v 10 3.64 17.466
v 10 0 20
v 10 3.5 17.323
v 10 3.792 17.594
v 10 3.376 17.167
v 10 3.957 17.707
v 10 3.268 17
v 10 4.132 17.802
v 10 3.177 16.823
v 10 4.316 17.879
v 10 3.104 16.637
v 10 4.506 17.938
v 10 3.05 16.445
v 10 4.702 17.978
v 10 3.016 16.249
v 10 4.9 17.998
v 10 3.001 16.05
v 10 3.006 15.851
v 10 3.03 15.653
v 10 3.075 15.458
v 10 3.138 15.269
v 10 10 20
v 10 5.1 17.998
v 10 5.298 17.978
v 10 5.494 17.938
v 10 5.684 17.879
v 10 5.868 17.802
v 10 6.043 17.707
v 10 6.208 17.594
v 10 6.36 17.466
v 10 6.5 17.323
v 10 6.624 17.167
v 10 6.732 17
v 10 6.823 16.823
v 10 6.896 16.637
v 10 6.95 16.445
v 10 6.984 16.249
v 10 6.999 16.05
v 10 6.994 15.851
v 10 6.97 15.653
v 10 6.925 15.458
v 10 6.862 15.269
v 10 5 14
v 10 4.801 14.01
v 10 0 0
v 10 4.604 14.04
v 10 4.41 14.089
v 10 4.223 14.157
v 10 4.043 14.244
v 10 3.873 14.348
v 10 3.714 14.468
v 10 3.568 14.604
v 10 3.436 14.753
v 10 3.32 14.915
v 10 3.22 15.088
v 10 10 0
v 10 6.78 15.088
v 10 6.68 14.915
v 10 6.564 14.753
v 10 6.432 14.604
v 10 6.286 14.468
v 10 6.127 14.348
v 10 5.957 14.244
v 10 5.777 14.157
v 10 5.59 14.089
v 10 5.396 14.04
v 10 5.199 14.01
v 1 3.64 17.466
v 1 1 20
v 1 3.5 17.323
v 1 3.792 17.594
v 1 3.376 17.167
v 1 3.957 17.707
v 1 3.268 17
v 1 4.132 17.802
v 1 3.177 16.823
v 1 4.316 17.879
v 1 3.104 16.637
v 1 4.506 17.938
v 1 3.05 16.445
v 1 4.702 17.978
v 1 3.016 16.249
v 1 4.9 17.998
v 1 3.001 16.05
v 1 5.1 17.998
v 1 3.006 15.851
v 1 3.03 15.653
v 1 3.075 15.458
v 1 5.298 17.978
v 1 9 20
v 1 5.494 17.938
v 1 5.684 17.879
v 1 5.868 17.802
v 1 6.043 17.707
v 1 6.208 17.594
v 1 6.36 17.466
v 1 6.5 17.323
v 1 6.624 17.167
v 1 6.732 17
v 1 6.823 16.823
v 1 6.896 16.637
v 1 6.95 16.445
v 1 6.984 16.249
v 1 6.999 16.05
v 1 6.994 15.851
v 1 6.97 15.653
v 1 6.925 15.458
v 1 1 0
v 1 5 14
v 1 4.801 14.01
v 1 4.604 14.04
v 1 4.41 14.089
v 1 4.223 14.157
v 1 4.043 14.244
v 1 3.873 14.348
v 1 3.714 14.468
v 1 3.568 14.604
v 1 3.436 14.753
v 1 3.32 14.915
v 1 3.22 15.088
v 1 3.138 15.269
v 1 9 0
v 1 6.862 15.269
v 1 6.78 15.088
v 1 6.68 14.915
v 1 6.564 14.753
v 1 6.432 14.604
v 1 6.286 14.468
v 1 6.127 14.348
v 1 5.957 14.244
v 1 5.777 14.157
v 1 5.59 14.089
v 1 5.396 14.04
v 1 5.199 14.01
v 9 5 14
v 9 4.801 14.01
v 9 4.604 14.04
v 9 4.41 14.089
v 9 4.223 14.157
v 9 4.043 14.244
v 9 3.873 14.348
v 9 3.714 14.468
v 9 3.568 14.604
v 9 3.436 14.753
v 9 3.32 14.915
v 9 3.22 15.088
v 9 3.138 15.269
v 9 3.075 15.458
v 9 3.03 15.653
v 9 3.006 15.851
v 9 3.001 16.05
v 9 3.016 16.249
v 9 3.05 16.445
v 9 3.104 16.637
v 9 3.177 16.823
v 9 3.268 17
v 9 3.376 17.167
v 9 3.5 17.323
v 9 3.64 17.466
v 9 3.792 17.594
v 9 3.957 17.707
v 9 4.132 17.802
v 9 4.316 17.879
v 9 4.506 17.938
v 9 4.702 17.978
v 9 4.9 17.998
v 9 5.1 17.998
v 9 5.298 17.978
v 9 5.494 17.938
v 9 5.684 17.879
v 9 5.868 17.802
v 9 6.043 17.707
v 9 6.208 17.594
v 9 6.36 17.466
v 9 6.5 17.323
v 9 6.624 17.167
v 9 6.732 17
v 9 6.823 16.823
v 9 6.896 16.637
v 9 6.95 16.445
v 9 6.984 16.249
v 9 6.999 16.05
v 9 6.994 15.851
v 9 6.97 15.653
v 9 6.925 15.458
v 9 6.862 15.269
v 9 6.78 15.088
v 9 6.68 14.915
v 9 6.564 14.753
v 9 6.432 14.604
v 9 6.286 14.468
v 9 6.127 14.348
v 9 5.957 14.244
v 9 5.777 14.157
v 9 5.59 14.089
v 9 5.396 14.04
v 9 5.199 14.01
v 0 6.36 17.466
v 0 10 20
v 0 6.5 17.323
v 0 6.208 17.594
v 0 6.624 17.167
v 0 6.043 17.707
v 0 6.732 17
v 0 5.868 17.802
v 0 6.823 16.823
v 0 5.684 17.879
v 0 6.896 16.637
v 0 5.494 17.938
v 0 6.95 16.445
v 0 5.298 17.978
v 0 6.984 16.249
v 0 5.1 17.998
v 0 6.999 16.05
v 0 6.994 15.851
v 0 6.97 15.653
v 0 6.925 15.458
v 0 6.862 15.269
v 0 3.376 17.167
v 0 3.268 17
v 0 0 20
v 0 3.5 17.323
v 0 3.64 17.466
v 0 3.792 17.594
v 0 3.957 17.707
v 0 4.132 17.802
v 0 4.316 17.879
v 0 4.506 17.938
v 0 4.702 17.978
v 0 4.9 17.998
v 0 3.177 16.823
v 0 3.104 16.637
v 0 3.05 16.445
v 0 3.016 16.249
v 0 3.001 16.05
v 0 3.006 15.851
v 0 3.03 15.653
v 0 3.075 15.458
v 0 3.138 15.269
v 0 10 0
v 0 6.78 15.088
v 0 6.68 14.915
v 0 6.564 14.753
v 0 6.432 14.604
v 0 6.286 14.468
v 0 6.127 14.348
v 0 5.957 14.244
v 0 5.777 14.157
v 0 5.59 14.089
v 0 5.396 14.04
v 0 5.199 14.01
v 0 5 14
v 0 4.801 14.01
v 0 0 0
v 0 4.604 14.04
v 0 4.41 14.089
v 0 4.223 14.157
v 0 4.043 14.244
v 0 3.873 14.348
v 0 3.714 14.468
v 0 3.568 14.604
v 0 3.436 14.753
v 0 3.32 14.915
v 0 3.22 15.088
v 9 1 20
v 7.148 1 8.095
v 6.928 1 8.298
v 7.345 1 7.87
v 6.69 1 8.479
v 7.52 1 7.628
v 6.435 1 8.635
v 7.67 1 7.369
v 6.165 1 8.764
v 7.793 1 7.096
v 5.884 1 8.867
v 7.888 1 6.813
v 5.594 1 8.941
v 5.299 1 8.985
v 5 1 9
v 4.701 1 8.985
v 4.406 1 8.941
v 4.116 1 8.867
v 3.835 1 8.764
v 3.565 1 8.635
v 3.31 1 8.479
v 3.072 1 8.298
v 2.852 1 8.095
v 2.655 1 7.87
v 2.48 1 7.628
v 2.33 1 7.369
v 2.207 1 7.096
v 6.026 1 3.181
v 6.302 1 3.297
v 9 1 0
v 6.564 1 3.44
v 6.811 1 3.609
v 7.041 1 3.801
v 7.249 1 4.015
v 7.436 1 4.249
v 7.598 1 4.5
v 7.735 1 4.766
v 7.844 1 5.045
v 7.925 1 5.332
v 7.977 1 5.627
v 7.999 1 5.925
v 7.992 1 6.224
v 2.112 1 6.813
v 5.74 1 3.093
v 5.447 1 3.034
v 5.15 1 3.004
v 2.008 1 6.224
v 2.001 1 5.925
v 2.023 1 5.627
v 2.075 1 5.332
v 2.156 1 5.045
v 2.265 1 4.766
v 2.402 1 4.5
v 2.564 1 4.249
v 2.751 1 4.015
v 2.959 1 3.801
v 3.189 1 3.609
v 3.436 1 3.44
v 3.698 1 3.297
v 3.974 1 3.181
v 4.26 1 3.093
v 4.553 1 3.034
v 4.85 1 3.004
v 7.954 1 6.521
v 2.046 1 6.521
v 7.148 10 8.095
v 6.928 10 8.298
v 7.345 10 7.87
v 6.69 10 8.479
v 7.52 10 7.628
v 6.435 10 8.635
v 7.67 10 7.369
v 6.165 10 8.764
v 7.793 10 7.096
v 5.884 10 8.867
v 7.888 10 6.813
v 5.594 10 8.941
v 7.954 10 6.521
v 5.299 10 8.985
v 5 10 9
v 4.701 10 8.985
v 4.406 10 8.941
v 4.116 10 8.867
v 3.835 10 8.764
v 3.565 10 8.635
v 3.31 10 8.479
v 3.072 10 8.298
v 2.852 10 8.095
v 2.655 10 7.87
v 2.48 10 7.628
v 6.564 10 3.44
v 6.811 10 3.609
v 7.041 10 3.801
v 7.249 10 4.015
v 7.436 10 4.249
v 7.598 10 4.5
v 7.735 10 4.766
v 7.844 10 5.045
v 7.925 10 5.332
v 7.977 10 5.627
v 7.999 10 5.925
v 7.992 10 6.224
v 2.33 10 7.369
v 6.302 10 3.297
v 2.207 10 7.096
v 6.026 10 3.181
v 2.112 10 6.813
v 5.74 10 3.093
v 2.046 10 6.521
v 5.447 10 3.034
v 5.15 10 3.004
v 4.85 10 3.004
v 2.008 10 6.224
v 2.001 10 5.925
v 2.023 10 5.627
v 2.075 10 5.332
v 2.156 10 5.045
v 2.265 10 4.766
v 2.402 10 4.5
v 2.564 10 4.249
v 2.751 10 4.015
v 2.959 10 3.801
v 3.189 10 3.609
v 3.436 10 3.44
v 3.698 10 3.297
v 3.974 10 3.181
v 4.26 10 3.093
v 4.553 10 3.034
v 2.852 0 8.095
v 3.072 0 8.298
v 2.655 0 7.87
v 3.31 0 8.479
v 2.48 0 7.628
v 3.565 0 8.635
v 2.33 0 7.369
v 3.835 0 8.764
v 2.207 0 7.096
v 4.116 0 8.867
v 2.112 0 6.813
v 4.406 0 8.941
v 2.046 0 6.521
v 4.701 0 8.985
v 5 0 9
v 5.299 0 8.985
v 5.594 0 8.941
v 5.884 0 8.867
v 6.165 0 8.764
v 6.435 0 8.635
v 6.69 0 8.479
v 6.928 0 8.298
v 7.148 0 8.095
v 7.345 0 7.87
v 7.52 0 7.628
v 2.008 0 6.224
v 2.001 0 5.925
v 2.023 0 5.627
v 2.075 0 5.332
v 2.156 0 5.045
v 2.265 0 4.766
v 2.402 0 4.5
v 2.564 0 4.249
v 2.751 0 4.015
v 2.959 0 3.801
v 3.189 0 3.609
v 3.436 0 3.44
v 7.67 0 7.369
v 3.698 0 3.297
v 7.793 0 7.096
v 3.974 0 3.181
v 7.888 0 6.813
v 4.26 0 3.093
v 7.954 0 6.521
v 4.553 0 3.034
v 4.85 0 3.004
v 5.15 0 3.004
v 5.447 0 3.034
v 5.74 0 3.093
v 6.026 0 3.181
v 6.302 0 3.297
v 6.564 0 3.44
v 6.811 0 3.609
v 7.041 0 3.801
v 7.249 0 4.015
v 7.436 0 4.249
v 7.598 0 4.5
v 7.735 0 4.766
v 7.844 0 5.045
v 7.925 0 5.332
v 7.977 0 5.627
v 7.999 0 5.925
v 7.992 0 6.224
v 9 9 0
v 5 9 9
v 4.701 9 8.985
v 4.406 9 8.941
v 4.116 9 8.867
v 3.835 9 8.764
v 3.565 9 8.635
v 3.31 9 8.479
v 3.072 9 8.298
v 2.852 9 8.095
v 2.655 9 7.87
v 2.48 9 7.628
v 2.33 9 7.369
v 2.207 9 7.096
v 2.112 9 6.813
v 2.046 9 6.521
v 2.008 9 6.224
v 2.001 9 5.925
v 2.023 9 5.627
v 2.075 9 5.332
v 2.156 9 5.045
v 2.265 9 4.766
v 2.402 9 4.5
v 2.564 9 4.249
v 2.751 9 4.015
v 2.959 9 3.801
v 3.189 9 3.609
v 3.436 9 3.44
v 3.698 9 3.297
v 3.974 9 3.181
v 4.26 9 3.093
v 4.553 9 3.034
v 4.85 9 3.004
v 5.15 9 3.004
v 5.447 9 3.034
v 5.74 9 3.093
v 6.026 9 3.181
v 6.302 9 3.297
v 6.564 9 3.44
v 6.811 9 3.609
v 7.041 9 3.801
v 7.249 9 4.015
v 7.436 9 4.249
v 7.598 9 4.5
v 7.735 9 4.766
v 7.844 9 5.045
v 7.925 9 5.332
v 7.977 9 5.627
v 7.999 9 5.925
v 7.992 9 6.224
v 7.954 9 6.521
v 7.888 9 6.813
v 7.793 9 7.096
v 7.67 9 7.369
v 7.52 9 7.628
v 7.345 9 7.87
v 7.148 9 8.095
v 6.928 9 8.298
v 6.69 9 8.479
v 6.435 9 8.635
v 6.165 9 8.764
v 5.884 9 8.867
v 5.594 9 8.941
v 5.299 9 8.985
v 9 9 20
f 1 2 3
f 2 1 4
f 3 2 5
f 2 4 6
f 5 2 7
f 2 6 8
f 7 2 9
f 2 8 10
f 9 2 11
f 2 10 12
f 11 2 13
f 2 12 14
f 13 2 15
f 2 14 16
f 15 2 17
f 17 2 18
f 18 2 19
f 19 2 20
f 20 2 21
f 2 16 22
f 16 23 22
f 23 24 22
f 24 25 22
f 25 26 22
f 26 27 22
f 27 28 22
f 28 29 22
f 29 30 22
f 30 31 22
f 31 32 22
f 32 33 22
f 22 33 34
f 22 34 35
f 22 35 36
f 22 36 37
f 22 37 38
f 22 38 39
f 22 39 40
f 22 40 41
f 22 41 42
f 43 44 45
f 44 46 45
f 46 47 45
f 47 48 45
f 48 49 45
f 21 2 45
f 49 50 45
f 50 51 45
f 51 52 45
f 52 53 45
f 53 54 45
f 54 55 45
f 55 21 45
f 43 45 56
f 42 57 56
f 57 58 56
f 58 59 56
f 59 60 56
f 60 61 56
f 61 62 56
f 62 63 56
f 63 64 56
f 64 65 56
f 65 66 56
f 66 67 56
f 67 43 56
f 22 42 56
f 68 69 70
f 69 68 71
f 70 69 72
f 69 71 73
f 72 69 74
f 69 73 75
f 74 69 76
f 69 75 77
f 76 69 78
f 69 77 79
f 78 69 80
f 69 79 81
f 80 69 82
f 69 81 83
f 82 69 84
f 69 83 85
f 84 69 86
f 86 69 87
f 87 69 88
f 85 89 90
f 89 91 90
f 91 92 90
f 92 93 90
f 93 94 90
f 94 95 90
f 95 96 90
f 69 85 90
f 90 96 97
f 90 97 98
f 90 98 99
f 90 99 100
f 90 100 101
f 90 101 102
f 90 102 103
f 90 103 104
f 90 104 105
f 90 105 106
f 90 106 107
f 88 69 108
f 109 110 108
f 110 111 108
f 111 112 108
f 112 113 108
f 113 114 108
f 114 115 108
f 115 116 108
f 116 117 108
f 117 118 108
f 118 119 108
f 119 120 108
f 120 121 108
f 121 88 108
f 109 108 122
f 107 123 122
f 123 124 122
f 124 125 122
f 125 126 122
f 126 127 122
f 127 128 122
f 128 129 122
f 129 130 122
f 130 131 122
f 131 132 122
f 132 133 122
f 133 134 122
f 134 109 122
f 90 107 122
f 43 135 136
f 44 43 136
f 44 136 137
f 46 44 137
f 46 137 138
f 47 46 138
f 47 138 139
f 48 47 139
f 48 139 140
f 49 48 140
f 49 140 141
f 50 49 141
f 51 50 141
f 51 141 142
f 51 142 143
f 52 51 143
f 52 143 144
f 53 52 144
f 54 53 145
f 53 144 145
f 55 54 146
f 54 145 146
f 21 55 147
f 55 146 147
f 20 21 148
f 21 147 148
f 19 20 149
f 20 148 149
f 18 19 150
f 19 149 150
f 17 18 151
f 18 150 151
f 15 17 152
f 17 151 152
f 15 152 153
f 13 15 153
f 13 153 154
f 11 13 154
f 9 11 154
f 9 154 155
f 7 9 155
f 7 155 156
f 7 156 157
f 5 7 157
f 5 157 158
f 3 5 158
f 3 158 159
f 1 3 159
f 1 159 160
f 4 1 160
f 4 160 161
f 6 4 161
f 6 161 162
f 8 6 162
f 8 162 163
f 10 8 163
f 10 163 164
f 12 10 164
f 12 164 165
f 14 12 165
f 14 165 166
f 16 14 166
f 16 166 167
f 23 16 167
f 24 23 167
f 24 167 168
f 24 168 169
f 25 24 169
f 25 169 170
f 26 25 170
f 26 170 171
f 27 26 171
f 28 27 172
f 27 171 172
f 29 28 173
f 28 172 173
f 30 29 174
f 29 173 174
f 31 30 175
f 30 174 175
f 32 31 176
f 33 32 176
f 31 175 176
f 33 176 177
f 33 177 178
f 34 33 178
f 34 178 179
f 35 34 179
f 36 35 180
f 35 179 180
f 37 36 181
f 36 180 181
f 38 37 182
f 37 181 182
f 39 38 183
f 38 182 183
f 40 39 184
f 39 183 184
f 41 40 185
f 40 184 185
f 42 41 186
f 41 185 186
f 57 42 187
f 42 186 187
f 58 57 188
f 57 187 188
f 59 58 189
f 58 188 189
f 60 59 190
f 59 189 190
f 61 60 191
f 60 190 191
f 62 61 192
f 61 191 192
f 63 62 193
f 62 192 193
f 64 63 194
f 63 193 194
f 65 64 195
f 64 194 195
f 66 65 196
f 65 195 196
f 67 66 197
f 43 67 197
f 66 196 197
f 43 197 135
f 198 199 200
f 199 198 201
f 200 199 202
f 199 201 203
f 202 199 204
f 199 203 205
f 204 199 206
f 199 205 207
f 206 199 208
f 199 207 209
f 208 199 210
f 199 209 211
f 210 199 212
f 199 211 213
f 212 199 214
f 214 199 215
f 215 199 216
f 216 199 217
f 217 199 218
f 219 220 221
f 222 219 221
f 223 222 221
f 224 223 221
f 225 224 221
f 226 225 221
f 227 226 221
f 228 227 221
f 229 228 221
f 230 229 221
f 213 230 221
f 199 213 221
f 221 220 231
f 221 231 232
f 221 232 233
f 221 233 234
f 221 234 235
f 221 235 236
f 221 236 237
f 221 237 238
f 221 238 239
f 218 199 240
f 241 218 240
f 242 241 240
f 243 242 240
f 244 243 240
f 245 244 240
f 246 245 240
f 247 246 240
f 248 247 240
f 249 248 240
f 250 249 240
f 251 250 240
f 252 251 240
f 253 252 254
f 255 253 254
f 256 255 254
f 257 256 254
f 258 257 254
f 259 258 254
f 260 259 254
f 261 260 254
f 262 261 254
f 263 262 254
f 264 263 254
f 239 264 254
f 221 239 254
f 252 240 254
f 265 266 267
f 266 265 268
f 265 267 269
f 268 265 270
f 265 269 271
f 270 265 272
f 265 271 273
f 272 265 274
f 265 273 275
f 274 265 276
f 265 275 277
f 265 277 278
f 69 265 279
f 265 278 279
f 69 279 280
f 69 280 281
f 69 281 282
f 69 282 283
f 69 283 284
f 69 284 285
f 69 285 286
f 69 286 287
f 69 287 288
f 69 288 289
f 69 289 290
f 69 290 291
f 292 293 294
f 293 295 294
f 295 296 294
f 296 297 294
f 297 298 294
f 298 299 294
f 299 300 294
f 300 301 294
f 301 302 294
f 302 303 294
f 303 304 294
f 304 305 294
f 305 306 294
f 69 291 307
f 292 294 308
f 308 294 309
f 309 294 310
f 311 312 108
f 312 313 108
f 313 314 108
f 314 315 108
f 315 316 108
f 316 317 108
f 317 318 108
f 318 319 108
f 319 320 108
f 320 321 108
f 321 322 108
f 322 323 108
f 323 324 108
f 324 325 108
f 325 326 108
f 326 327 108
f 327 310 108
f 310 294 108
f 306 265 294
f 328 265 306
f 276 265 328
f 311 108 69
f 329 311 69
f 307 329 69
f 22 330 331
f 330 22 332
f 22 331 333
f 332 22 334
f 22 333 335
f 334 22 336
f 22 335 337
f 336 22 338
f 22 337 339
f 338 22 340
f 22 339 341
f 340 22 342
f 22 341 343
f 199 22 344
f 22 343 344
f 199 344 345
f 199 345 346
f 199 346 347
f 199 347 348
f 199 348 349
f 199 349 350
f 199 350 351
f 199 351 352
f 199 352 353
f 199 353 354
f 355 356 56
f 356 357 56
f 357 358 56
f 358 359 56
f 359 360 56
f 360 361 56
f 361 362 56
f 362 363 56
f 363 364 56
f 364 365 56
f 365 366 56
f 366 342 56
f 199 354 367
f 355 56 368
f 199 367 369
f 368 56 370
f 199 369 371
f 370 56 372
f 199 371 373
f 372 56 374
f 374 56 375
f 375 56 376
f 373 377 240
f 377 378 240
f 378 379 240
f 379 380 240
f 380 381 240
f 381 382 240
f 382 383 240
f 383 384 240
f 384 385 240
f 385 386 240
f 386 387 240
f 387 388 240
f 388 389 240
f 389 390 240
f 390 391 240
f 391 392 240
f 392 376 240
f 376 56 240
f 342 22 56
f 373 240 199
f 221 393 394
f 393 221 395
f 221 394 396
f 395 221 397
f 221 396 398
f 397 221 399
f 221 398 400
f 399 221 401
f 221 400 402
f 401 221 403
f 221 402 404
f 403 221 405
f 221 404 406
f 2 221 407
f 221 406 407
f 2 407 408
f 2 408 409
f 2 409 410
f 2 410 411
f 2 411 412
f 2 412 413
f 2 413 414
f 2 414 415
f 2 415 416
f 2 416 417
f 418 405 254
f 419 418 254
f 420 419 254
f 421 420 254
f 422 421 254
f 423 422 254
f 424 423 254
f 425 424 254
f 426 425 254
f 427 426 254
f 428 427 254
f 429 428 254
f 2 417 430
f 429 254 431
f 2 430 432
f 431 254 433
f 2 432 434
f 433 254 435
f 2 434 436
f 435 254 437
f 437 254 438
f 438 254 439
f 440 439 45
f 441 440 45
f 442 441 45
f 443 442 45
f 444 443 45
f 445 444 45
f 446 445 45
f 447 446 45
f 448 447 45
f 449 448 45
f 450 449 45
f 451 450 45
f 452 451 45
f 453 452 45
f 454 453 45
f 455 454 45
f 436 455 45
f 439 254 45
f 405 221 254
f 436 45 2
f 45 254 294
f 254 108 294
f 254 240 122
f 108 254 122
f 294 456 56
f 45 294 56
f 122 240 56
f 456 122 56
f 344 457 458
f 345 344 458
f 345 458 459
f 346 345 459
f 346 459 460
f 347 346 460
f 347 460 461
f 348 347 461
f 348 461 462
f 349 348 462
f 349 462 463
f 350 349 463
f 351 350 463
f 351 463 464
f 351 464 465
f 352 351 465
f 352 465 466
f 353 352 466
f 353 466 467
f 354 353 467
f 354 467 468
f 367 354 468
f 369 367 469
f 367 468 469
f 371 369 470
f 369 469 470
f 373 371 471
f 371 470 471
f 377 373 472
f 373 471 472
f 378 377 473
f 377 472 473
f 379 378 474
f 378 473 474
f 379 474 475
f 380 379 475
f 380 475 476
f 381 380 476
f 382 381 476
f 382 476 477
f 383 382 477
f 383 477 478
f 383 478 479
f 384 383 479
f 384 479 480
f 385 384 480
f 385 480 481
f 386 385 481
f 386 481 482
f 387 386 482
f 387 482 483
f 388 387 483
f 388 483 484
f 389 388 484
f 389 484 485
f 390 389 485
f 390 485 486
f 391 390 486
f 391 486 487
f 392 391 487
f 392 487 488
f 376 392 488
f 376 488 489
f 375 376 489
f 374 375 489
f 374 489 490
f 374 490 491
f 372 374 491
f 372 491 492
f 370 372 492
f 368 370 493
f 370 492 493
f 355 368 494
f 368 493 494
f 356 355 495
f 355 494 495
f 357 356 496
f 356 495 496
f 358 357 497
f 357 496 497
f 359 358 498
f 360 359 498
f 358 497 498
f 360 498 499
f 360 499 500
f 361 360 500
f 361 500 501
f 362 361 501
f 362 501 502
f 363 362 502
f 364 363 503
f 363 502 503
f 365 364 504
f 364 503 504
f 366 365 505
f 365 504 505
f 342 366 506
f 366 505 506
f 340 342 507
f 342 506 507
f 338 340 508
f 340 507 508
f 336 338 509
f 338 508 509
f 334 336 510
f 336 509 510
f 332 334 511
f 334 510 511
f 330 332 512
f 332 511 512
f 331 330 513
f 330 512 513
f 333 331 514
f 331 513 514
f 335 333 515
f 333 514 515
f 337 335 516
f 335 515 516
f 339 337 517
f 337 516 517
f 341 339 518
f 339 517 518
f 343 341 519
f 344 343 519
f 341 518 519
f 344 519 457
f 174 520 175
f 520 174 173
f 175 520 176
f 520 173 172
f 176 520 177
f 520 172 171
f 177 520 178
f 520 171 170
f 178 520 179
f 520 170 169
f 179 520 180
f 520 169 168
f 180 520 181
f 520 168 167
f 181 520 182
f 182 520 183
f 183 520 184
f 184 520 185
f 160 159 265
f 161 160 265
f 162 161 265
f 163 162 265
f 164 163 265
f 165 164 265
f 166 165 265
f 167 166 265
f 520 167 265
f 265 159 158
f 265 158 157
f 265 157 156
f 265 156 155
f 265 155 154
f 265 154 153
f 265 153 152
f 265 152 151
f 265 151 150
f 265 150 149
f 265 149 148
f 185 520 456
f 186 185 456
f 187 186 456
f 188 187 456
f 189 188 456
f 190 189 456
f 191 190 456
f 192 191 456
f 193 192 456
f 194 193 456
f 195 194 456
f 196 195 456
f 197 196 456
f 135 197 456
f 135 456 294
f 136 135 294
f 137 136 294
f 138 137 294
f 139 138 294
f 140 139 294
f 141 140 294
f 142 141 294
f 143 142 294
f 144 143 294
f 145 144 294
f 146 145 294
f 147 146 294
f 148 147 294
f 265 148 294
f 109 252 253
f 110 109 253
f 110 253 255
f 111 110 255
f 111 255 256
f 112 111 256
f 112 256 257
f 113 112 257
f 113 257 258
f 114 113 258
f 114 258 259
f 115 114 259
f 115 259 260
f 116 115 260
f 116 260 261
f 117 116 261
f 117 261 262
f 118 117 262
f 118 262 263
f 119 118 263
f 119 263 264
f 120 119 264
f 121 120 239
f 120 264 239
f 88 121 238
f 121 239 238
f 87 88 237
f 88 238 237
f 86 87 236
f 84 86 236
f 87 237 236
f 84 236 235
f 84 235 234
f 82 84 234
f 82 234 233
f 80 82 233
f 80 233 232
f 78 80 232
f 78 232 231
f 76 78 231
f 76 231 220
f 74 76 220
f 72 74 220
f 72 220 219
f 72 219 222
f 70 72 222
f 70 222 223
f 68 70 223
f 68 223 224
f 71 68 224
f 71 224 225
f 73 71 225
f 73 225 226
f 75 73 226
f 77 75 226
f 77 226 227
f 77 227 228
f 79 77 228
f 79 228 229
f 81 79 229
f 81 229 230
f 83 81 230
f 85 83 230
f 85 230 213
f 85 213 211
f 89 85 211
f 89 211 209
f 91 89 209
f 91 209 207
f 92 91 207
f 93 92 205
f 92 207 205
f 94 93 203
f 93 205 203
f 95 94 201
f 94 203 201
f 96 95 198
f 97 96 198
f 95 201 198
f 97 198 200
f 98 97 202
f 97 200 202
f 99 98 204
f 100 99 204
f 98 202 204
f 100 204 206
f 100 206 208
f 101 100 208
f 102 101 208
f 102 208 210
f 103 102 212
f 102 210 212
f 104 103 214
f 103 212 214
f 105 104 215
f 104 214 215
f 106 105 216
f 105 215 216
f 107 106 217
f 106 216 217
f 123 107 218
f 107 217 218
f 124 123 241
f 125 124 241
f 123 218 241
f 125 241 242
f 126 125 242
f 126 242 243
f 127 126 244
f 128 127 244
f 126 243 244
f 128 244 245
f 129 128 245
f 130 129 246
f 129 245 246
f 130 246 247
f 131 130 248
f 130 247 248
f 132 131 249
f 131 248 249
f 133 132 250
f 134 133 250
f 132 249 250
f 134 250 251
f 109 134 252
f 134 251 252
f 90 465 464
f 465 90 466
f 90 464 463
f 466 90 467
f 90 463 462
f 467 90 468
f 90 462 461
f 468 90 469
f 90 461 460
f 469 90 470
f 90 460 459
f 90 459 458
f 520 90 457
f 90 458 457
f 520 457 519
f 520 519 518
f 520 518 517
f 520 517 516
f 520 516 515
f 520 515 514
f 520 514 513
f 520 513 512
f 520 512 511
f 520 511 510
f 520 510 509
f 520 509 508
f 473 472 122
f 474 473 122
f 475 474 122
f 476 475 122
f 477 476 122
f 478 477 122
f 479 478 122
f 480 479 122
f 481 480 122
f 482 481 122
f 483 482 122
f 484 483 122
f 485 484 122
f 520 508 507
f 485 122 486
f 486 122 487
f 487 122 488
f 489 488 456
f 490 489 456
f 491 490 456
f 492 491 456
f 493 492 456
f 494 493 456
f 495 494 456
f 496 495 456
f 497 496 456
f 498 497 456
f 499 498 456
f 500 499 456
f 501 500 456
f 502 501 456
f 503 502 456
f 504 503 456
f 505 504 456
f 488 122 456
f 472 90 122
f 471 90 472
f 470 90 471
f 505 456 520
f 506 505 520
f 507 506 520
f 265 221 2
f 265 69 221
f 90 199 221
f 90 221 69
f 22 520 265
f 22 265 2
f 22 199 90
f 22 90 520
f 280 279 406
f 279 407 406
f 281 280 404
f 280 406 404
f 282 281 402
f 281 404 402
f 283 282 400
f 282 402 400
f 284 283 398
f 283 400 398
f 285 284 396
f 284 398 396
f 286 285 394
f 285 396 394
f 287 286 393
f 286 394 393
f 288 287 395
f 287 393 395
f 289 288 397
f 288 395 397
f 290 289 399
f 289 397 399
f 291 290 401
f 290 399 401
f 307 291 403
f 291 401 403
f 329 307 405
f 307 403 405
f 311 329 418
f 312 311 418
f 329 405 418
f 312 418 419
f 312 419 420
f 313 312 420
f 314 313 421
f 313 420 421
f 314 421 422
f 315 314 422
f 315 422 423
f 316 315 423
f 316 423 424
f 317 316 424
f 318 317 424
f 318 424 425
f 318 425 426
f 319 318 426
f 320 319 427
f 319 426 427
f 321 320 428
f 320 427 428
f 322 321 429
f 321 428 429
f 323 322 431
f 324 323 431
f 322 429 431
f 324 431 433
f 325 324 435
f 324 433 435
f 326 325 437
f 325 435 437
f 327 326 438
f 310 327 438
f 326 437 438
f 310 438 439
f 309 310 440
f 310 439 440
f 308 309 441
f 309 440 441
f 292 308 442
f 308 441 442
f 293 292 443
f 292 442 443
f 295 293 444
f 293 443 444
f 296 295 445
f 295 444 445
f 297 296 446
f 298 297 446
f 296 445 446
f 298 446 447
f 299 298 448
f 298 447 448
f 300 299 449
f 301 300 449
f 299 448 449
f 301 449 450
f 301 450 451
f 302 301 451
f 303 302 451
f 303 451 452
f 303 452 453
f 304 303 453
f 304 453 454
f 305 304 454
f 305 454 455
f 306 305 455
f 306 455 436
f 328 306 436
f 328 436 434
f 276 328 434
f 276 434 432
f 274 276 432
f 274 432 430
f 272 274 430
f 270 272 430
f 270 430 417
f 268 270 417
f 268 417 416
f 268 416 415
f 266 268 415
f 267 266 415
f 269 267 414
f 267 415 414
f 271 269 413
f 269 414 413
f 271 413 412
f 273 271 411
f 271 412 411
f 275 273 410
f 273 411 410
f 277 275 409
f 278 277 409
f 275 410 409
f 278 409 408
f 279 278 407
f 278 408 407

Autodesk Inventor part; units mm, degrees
ref_plane "YZ Plane" through (0, 0, 0) normal (1, 0, 0) x (0, 1, 0)
ref_plane "XZ Plane" through (0, 0, 0) normal (0, 1, 0) x (-1, 0, 0)
ref_plane "XY Plane" through (0, 0, 0) normal (0, 0, 1) x (1, 0, 0)
sketch "スケッチ1" plane through (0, 0, 0) normal (0, 0, 1) x (1, 0, 0)
  line L0 (0, 0) -> (10, 0)
  line L1 (10, 0) -> (10, 10)
  line L2 (10, 10) -> (0, 10)
  line L3 (0, 10) -> (0, 0)
  line L4 (1, 9) -> (9, 9)
  line L5 (9, 9) -> (9, 1)
  line L6 (9, 1) -> (1, 1)
  line L7 (1, 1) -> (1, 9)
  dimension "d0" = 10
  dimension "d1" = 10
  dimension "d2" = 1
extrude "押し出し1" add sketch "スケッチ1" along normal blind 20
sketch "スケッチ2" plane through (10, 0, 0) normal (1, 0, 0) x (0, 0, -1)
  line L0 (-20, 0) -> (-20, 10) projected
  point P0 (0, 0)
  point P1 (-16, 5)
  dimension "d5" = 4
hole "穴1" at (10, 5, 16) direction (-1, 0, 0) diameter 4 end through all
sketch "スケッチ3" plane through (0, 10, 0) normal (0, 1, 0) x (1, 0, 0)
  line L0 (10, -20) -> (0, -20) projected
  point P0 (0, 0)
  point P1 (5, -6)
  dimension "d13" = 14
hole "穴2" at (5, 10, 6) direction (0, -1, 0) diameter 6 end through all
properties part number "finger_k_mk_1"
